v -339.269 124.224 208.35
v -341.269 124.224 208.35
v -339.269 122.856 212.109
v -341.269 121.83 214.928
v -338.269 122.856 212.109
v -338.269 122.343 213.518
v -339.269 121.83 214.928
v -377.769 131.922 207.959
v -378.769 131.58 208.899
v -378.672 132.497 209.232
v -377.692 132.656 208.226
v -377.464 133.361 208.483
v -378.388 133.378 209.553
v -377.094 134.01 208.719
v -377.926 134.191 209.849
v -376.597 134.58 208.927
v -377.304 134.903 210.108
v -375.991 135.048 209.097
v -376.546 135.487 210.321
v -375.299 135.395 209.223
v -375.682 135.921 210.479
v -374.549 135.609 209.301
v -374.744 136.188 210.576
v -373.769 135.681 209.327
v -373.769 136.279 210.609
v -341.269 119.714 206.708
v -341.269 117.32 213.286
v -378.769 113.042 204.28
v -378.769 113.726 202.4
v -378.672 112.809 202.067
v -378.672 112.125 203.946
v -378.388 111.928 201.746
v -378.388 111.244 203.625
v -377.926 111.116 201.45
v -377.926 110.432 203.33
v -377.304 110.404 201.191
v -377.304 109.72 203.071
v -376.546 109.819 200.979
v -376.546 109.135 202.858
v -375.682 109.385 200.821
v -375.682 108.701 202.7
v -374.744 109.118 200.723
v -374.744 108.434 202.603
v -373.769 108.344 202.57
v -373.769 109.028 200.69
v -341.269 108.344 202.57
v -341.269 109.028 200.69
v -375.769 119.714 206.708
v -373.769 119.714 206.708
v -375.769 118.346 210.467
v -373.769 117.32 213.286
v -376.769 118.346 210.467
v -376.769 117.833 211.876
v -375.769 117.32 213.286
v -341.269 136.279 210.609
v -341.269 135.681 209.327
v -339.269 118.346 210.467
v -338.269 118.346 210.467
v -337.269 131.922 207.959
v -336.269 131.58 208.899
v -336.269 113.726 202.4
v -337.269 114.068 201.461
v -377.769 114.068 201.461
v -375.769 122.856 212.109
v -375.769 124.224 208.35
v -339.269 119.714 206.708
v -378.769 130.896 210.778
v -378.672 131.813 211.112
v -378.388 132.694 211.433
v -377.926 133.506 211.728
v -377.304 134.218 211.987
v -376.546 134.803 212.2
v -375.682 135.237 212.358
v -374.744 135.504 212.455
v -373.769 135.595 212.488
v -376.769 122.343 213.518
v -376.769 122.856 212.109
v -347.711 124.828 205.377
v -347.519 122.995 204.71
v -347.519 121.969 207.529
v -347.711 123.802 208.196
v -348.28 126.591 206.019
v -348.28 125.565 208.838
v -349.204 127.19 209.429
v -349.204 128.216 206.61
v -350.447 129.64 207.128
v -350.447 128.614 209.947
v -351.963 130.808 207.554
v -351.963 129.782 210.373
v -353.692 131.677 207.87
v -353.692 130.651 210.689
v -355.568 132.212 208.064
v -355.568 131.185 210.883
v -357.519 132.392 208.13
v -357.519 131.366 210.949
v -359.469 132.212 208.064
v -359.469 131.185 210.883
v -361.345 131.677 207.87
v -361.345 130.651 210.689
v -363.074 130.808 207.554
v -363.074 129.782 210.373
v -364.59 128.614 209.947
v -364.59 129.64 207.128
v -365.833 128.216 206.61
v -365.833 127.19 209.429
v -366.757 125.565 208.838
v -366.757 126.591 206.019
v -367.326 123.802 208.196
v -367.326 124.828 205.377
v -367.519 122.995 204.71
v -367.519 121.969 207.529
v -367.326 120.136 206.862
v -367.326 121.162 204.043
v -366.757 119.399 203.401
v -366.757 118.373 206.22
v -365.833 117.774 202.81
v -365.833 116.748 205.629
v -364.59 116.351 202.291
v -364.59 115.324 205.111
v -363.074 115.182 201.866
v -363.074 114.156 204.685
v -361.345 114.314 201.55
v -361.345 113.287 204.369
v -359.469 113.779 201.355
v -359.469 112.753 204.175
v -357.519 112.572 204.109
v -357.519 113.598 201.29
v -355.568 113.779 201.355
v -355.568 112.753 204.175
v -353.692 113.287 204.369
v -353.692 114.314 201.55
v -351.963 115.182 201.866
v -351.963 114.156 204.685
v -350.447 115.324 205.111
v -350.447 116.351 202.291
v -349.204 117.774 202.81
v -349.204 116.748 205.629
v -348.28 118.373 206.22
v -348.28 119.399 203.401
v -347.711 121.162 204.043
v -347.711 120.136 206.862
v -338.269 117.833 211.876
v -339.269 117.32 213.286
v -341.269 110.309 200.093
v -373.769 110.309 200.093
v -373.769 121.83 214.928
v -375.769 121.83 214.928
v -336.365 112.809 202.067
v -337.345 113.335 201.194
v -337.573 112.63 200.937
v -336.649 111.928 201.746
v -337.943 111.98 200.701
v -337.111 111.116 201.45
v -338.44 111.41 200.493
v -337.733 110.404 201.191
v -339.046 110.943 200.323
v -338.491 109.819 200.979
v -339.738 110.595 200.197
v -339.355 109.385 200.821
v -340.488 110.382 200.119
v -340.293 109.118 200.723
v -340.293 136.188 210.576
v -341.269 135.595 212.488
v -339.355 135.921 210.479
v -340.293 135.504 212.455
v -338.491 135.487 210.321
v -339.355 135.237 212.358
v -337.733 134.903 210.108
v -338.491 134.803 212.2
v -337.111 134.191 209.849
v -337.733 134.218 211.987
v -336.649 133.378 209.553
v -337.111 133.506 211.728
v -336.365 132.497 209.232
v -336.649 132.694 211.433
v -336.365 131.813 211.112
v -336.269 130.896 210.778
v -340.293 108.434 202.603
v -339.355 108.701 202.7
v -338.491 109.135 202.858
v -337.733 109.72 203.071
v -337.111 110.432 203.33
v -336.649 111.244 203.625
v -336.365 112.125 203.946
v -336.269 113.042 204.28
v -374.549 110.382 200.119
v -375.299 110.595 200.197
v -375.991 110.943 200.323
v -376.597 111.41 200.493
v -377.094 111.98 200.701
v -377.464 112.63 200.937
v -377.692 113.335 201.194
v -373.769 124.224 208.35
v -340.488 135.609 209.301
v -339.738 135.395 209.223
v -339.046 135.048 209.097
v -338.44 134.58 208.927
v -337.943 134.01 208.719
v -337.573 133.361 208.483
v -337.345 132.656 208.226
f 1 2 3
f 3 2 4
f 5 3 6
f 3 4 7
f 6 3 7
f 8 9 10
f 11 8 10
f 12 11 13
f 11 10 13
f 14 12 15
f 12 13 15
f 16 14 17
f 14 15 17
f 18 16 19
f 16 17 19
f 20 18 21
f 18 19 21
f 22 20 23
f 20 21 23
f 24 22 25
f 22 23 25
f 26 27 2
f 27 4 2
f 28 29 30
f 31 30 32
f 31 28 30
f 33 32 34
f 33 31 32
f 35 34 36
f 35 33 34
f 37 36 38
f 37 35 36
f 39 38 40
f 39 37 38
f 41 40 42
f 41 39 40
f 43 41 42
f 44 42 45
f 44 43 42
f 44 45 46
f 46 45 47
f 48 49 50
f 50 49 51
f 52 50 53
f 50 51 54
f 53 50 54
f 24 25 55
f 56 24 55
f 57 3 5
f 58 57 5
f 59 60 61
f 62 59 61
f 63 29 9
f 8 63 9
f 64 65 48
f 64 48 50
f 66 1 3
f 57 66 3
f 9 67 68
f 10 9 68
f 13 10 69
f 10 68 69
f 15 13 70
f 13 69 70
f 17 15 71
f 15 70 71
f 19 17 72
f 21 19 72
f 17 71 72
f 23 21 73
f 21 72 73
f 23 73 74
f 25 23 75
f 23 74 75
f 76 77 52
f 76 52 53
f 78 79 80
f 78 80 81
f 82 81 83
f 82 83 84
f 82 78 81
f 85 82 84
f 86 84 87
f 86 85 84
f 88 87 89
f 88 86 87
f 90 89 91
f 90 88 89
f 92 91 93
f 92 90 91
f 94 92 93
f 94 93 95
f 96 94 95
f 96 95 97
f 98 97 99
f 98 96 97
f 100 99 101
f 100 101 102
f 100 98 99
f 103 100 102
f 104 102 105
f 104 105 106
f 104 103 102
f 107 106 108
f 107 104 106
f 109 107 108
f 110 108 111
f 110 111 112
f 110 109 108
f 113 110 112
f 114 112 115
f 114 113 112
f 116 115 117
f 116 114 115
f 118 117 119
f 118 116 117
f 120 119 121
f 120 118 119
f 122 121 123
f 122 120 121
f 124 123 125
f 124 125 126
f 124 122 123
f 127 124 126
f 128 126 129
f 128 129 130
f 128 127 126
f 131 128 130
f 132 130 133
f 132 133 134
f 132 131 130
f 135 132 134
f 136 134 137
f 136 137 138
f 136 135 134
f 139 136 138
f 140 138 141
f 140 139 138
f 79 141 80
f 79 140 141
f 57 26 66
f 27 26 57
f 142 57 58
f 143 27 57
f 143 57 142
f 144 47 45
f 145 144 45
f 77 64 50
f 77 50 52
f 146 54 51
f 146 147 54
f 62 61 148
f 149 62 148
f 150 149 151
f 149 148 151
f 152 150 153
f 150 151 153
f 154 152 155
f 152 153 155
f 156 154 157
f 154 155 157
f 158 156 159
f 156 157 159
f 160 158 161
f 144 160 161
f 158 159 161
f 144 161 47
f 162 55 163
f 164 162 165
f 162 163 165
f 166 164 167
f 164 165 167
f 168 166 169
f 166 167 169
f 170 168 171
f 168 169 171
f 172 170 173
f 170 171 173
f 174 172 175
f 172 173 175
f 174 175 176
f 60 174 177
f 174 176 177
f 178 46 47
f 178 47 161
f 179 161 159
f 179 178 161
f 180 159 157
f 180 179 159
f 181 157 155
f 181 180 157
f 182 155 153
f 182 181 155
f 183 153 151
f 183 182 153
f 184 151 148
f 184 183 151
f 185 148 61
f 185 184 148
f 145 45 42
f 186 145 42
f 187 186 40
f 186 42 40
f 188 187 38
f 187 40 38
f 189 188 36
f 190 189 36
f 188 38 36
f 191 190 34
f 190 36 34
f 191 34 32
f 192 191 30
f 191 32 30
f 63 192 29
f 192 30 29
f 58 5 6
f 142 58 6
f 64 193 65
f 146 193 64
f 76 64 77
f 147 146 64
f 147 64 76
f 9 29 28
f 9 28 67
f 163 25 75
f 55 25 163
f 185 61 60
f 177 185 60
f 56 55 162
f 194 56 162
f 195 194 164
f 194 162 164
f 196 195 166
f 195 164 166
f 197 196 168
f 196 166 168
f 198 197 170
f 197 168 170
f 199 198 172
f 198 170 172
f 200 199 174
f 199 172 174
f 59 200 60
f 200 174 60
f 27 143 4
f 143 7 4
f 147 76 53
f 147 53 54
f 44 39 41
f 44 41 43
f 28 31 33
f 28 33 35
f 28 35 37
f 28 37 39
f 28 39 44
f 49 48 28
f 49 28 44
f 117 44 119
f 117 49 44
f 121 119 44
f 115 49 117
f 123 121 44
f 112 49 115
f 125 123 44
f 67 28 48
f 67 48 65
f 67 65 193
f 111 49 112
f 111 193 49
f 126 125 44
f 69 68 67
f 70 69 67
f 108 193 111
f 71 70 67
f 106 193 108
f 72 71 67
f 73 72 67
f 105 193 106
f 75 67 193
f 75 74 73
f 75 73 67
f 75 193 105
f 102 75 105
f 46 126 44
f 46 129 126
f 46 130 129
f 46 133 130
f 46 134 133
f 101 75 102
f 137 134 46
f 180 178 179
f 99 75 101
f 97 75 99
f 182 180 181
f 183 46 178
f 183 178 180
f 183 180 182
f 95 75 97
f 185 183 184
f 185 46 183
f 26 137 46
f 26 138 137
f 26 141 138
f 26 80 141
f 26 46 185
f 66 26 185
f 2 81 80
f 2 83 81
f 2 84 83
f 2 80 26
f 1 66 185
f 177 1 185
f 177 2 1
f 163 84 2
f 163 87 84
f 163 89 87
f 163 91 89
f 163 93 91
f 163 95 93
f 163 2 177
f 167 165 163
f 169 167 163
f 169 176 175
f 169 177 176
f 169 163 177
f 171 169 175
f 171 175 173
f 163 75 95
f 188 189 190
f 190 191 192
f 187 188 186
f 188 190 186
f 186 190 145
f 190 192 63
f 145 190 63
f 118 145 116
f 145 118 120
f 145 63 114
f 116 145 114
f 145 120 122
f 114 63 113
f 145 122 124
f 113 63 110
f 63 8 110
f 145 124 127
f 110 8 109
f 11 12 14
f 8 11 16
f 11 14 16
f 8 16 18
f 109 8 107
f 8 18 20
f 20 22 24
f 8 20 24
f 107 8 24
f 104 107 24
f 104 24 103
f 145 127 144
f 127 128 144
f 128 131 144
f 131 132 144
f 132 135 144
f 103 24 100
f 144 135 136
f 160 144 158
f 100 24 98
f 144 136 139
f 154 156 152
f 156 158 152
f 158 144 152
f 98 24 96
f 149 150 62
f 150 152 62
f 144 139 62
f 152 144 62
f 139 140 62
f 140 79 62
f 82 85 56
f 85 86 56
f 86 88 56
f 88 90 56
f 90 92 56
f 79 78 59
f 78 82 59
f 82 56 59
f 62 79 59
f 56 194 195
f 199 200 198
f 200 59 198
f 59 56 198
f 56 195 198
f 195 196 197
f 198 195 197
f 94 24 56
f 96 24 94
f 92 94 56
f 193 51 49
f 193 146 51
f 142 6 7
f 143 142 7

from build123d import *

# Parameters (mm, degrees)
SKETCH144_W             = 42.5
SKETCH144_H             = 29
SKETCH144_R             = 10
PAD034_DEPTH            = 3
PAD036_DEPTH            = 2.4
FILLET021_R             = 5
CHAMFER004_SIZE         = 1
BODY013_PLACEMENT_ANGLE = 20


with BuildPart() as part:
    # Sketch144 → Pad034 (new body)
    with BuildSketch(Plane.XY):
        Rectangle(SKETCH144_W, SKETCH144_H)
        Circle(SKETCH144_R, mode=Mode.SUBTRACT)
    extrude(amount=PAD034_DEPTH)

    # Sketch146 (on Face3 of Pad034) → Pad036 (join, symmetric)
    with BuildSketch(Plane(origin=(0, 0, 0), x_dir=(-1, 0, 0), z_dir=(0, 1, 0))):
        Polygon((16.25, 3), (18.25, 3), (18.25, 7), (19.25, 7), (19.25, 8.5), (18.25, 10), (16.25, 10), align=None)
    pad036 = extrude(amount=PAD036_DEPTH, both=True)

    # Mirrored010: Pad036 across Sketch146 V_Axis
    add(pad036.mirror(Plane(origin=(0, 0, 0), x_dir=(0, 1, 0), z_dir=(-1, 0, 0))))

    # Fillet021
    fillet021_edges = [part.edges().sort_by_distance(p)[0] for p in [
        (21.25, 14.5, 1.5),
        (-21.25, 14.5, 1.5),
        (-21.25, -14.5, 1.5),
        (21.25, -14.5, 1.5),
    ]]
    fillet(fillet021_edges, radius=FILLET021_R)

    # Chamfer004
    chamfer004_edges = [part.edges().sort_by_distance(p)[0] for p in [
        (0, 14.5, 0),
    ]]
    chamfer(chamfer004_edges, length=CHAMFER004_SIZE)


with BuildPart() as part_1:
    # Body013 placement: moved
    add(part.part.moved(Location((-357.518507, 122.995147, 204.709932))).rotate(Axis((-357.518507, 122.995147, 204.709932), (1, 0, 0)), BODY013_PLACEMENT_ANGLE))


solid = part_1.part
